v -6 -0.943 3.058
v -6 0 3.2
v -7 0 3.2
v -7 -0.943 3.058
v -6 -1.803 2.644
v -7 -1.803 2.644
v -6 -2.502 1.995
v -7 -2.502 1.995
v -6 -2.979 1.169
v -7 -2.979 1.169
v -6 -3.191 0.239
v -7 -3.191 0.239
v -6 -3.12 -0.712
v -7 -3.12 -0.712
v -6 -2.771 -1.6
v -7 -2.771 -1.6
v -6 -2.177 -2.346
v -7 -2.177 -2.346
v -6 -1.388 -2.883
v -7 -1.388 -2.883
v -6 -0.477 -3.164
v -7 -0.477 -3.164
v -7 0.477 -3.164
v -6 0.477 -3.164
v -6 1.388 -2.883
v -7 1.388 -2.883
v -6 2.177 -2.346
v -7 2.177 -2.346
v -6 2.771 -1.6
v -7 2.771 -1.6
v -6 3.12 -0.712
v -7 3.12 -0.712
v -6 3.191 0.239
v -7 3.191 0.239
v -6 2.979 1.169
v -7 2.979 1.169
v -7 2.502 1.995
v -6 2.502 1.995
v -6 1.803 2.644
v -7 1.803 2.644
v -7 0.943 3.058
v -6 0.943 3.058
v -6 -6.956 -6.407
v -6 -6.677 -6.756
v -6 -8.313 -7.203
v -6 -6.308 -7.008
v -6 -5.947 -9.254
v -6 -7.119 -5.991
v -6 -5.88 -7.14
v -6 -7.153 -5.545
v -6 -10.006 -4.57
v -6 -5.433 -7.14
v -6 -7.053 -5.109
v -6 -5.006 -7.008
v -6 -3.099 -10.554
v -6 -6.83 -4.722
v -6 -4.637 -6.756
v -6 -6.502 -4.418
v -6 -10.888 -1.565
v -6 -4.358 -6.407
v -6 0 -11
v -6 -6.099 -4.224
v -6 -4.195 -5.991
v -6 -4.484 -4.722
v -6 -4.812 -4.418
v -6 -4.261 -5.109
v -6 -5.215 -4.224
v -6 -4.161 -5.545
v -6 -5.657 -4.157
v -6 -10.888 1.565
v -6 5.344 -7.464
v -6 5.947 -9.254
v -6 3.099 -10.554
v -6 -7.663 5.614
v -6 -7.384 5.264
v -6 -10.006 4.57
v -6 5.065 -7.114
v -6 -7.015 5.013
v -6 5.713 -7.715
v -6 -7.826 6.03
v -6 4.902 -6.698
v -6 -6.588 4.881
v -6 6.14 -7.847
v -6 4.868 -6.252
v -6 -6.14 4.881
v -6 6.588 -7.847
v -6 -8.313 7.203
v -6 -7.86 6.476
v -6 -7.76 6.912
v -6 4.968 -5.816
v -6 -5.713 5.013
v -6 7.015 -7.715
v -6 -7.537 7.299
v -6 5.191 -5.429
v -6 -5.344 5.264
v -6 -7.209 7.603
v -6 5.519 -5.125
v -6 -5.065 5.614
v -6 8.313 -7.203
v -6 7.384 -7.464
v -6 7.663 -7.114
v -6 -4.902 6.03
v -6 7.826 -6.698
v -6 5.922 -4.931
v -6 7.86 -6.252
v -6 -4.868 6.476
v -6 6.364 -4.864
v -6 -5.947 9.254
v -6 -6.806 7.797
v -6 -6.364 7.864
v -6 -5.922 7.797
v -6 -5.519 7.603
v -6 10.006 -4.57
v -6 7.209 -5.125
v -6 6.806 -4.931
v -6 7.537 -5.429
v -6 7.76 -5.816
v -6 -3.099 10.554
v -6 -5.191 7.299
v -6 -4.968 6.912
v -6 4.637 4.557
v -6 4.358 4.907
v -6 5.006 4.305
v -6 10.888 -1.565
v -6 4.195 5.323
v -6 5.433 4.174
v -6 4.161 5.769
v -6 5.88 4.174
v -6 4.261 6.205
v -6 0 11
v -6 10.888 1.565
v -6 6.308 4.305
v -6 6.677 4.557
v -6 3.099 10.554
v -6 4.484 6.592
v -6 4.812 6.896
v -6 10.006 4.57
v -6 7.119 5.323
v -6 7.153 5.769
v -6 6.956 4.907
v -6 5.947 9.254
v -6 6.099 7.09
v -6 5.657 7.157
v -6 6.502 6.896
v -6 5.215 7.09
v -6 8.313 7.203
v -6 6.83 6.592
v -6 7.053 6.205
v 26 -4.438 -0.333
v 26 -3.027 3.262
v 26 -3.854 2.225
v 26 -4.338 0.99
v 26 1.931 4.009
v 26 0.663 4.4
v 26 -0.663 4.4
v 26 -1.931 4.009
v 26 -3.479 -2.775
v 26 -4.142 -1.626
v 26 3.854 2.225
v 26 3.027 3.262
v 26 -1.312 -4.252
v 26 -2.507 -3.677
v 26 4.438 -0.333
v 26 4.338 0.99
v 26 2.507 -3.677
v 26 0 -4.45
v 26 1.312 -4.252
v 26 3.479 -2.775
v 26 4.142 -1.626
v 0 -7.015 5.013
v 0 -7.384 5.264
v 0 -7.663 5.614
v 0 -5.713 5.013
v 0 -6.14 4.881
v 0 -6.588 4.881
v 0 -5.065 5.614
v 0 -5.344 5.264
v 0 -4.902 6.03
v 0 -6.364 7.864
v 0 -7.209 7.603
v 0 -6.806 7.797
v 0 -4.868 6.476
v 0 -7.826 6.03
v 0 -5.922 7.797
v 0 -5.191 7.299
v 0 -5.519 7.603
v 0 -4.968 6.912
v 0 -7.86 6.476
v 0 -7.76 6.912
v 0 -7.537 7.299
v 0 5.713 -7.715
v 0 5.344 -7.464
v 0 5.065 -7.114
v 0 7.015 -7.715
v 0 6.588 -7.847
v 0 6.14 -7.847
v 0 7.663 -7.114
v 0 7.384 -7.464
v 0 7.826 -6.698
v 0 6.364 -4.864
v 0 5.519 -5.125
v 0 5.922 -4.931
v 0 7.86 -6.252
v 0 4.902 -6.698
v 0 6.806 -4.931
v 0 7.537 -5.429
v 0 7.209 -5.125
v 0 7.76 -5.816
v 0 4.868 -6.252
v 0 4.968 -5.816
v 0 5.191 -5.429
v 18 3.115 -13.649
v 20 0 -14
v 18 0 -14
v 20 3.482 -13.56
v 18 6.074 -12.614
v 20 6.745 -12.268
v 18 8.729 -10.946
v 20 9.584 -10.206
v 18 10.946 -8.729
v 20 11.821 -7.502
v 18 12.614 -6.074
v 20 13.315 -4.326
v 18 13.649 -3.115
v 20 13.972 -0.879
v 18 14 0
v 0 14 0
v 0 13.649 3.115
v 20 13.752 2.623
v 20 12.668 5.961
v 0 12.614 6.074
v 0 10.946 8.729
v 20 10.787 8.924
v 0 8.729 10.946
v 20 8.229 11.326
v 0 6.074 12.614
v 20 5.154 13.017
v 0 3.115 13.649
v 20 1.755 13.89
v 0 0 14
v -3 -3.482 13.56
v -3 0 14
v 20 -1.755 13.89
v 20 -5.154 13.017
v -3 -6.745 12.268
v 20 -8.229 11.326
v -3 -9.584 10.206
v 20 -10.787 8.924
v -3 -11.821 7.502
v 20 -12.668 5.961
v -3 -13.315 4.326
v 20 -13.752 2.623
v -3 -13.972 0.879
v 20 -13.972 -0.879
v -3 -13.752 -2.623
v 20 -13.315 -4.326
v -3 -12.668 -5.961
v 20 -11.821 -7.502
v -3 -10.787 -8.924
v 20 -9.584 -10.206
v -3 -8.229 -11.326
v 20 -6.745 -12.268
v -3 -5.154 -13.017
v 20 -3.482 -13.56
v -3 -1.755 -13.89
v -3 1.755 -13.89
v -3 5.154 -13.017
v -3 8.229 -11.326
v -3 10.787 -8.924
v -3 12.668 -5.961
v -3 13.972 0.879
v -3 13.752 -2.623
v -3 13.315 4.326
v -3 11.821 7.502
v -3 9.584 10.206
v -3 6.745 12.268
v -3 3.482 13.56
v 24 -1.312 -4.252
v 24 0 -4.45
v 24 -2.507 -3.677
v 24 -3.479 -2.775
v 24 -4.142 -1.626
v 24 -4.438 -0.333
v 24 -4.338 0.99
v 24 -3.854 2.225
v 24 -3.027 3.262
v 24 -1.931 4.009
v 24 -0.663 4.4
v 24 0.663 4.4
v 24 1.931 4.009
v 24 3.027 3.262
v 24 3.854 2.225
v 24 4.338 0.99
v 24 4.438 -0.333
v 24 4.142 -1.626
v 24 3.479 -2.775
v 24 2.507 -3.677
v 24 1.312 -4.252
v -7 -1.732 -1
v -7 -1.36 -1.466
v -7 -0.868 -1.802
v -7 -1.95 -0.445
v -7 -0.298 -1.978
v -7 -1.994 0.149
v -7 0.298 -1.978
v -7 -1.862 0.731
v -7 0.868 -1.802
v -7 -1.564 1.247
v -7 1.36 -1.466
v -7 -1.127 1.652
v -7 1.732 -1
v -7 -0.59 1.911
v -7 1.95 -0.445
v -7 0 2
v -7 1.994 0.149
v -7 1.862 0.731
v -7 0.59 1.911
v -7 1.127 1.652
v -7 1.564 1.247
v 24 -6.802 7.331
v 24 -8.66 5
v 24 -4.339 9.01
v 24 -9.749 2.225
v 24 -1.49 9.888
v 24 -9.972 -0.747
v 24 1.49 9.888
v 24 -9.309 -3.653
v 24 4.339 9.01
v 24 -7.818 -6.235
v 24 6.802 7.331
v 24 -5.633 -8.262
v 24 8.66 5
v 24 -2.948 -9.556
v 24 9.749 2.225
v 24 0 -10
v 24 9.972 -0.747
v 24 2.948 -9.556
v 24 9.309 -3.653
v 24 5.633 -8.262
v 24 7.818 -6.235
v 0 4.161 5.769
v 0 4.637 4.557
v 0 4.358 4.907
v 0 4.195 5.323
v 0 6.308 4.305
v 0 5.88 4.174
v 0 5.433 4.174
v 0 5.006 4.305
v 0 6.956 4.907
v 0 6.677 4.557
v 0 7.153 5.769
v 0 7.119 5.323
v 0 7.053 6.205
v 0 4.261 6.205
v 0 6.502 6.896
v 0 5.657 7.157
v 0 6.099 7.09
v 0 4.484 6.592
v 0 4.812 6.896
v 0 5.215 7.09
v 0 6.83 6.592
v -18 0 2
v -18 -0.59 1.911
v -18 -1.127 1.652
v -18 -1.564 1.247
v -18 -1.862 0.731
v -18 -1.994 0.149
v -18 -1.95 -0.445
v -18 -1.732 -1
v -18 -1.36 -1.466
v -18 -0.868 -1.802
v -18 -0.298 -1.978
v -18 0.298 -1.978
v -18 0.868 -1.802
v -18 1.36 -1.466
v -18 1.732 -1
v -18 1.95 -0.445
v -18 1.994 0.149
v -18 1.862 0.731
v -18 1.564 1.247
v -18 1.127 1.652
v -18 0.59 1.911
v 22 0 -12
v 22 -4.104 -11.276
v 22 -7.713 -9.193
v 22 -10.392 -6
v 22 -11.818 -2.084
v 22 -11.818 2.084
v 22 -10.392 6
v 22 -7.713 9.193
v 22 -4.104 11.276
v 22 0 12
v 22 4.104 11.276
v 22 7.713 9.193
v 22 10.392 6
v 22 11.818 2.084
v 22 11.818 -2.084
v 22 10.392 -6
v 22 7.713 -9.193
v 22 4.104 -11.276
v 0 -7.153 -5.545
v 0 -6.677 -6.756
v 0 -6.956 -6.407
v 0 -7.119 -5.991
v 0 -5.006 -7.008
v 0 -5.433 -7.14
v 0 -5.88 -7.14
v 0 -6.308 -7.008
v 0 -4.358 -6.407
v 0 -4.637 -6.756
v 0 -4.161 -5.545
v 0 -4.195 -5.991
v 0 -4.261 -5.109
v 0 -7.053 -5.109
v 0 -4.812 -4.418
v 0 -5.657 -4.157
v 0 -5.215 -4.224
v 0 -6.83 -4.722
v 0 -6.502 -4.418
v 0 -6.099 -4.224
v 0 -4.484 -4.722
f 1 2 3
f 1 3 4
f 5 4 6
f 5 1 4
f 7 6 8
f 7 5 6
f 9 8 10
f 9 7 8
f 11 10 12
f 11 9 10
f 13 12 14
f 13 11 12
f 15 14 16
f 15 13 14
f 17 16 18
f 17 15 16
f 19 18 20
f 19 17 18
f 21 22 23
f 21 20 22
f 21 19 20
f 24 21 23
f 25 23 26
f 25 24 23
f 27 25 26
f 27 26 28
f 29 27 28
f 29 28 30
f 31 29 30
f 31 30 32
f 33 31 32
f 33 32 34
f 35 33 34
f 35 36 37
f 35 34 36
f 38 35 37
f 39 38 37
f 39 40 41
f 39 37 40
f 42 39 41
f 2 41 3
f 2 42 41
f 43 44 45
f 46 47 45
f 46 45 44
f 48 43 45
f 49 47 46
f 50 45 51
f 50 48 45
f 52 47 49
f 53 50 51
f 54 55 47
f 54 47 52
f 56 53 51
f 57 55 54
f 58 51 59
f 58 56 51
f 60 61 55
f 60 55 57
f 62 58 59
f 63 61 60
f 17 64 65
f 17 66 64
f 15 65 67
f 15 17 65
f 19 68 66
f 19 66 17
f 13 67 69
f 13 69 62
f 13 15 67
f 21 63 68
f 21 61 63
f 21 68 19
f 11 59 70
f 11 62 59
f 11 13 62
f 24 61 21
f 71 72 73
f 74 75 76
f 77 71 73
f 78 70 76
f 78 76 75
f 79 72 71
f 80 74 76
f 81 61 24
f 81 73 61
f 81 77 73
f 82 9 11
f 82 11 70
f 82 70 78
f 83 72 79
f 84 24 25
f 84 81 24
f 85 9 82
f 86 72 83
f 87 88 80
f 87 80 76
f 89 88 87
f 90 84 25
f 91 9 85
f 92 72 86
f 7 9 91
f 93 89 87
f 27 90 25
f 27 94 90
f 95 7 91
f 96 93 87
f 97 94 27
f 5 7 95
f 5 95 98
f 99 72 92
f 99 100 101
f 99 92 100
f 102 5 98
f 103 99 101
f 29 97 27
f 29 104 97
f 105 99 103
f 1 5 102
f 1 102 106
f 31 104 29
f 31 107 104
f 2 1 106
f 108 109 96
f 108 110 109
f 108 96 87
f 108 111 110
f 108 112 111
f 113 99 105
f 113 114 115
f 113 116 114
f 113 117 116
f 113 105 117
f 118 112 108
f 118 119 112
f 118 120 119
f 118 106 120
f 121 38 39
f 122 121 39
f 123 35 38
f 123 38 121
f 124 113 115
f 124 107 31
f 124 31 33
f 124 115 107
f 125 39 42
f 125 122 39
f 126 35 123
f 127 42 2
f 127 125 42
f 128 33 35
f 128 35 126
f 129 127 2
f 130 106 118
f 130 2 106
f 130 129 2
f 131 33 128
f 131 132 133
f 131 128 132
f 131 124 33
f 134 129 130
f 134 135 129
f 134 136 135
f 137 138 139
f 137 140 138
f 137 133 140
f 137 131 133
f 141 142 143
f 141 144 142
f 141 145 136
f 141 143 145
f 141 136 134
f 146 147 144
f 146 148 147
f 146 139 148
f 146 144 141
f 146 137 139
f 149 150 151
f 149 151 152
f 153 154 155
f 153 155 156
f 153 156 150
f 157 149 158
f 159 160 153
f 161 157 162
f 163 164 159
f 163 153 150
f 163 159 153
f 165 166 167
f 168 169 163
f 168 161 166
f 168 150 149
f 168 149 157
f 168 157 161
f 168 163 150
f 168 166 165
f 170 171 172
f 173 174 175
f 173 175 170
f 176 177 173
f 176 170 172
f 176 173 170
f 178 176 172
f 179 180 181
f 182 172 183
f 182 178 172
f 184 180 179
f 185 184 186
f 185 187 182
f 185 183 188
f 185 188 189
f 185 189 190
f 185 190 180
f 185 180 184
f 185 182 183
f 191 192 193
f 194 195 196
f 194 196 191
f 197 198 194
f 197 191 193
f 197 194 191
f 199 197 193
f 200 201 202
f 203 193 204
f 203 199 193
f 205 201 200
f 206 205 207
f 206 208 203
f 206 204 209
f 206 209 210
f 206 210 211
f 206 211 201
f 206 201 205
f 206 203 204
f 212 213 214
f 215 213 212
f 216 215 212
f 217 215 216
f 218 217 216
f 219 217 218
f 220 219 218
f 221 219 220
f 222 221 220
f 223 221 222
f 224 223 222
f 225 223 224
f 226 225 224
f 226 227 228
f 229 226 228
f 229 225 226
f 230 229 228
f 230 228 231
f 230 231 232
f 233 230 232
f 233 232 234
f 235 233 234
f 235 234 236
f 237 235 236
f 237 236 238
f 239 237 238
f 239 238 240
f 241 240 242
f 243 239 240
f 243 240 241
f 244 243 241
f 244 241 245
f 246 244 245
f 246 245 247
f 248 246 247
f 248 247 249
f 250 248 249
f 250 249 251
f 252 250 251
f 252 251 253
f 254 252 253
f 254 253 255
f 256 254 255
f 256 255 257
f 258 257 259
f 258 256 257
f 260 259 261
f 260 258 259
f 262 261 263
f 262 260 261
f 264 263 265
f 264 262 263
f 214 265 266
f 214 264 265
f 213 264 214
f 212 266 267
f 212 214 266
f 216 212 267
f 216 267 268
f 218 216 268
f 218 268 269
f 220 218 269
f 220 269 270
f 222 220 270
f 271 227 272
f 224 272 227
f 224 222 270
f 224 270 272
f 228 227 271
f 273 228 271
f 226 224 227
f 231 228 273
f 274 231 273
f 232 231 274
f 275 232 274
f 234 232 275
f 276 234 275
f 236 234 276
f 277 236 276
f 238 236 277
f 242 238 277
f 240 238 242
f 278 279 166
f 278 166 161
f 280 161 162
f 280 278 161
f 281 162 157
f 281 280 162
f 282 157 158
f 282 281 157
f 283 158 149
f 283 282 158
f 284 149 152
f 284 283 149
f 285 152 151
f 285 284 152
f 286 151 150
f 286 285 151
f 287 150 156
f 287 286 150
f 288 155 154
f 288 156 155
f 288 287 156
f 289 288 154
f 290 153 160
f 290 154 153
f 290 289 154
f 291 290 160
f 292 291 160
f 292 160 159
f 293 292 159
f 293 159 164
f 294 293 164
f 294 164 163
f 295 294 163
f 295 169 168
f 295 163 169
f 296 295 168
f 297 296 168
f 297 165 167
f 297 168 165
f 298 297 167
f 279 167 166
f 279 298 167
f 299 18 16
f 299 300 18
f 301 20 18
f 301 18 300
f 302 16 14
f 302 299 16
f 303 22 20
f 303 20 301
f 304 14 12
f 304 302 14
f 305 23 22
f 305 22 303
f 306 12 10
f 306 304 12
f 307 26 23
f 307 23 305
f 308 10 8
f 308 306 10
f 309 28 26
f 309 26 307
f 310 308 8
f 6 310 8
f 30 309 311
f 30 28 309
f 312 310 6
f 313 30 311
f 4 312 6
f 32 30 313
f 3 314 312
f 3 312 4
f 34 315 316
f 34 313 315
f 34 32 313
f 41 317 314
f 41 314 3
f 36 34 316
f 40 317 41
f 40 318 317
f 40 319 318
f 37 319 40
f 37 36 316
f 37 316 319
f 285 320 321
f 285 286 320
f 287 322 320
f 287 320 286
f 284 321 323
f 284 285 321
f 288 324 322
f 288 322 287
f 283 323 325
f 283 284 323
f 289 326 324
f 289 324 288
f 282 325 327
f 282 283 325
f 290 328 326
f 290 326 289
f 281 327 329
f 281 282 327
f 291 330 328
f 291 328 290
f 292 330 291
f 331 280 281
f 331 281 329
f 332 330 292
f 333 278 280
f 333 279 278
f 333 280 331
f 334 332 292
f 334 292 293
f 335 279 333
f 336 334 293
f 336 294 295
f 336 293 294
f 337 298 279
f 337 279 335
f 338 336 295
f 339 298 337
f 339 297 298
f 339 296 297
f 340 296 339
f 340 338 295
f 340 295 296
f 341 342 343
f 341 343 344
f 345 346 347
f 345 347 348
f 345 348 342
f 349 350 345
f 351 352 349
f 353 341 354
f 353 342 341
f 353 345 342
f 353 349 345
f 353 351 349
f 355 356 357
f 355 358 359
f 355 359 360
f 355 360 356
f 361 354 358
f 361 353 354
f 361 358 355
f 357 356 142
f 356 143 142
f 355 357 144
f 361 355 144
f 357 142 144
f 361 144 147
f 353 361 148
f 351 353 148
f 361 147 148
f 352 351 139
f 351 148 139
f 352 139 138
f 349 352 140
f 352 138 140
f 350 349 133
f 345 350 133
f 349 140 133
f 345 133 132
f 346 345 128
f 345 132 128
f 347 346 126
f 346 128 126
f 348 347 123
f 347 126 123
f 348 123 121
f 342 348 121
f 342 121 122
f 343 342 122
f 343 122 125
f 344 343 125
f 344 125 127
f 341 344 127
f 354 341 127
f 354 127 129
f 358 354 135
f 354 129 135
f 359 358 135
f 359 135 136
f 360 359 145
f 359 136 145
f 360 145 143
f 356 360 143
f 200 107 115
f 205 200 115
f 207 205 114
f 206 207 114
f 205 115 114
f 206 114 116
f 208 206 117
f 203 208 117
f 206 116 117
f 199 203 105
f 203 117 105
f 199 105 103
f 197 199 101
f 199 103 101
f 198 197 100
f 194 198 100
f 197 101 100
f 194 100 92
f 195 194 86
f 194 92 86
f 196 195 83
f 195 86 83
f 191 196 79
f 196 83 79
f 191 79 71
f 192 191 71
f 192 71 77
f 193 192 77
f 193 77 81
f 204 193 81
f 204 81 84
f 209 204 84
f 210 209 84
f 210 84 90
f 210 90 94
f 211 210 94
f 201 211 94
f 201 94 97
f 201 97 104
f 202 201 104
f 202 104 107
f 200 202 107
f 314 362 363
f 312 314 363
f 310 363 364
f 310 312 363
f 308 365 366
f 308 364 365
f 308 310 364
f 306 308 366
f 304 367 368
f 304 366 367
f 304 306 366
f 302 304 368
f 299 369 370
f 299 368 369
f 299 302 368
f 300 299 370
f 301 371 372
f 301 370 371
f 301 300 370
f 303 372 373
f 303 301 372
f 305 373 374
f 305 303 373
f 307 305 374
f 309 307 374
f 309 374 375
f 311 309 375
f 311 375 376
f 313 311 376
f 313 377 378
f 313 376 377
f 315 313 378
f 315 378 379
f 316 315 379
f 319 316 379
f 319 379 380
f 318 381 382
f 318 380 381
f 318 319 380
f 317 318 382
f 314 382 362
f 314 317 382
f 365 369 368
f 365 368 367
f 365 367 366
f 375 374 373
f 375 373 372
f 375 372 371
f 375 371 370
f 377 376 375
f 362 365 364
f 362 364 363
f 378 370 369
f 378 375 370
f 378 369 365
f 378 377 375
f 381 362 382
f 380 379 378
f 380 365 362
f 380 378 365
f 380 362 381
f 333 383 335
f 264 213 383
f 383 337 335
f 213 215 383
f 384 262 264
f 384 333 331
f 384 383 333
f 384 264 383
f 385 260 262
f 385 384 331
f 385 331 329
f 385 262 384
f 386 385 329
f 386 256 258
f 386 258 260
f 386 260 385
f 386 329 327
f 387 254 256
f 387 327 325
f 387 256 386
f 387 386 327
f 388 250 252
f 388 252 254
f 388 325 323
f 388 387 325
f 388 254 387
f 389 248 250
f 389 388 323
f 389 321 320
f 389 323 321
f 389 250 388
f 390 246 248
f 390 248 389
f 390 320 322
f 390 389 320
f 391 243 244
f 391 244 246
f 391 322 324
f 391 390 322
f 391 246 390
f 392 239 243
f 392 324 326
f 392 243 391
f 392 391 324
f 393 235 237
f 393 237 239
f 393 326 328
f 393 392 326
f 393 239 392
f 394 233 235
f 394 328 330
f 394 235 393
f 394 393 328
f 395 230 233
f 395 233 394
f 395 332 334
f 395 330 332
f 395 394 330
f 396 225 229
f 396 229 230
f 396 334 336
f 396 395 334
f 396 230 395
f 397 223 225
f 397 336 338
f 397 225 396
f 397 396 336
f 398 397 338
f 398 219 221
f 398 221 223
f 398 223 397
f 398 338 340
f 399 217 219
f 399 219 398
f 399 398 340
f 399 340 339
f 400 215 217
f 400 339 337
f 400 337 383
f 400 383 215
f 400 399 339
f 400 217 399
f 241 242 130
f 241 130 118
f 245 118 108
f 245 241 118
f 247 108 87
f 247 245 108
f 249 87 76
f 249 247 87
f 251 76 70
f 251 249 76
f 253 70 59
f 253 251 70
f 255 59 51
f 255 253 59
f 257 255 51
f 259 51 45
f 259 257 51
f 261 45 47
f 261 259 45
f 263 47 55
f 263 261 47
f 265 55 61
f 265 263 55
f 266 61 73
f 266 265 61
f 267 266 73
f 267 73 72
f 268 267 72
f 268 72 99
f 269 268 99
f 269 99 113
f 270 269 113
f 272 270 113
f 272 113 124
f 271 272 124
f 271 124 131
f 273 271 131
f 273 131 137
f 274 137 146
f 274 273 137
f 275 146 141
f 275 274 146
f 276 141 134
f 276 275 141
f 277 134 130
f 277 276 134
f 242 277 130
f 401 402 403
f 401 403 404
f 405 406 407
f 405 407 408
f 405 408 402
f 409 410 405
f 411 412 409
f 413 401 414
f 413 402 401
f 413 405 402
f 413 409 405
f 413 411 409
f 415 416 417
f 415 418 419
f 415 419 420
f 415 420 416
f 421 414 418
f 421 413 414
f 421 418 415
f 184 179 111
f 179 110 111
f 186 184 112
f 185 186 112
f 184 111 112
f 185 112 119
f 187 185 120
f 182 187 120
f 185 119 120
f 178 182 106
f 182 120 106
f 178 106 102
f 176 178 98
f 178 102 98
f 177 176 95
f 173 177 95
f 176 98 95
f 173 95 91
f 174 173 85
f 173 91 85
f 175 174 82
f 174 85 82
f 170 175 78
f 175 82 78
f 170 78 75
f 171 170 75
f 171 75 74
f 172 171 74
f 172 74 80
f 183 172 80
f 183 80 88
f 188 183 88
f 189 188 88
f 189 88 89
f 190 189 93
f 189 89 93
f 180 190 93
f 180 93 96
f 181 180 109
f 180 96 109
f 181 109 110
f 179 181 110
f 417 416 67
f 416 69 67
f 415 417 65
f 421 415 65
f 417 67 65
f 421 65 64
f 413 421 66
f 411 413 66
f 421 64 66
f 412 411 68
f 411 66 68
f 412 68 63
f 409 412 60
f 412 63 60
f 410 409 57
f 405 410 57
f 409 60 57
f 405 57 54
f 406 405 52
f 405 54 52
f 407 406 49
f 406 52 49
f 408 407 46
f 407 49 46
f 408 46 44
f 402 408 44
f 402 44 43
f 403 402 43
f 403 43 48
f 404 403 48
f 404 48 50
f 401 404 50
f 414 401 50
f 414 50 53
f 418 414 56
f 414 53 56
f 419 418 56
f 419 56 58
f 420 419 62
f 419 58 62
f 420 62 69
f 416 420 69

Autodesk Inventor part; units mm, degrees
ref_plane "YZ Plane" through (0, 0, 0) normal (1, 0, 0) x (0, 1, 0)
ref_plane "XZ Plane" through (0, 0, 0) normal (0, 1, 0) x (-1, 0, 0)
ref_plane "XY Plane" through (0, 0, 0) normal (0, 0, 1) x (1, 0, 0)
sketch "Эскиз1" plane through (0, 0, 0) normal (1, 0, 0) x (0, 1, 0)
  circle A0 centre (0, 0) radius 14
  dimension "d0" = 28
extrude "Выдавливание1" add sketch "Эскиз1" along normal blind 18
sketch "Эскиз2" plane through (18, 0, 0) normal (1, 0, 0) x (0, 0, -1)
  circle A0 centre (0, 0) radius 14
  dimension "d3" = 28
extrude "Выдавливание2" add sketch "Эскиз2" along normal blind 6
chamfer "Фаска1" distance 4 angle 45 1 edges at (24, 0, 14)
sketch "Эскиз3" plane through (24, 0, 0) normal (1, 0, 0) x (0, 0, -1)
  circle A0 centre (0, 0) radius 4.45
  dimension "d9" = 8.9
extrude "Выдавливание3" add sketch "Эскиз3" along normal blind 2
sketch "Эскиз4" plane through (0, 0, 0) normal (-1, 0, 0) x (0, 0, 1)
  circle A0 centre (0, 0) radius 14
  dimension "d12" = 28
extrude "Выдавливание4" add sketch "Эскиз4" along normal blind 6
chamfer "Фаска2" distance 3 angle 45 1 edges at (-6, 0, -14)
sketch "Эскиз5" plane through (-6, 0, 0) normal (-1, 0, 0) x (0, 0, 1)
  circle A0 centre (0, 0) radius 3.2
  dimension "d18" = 6.4
extrude "Выдавливание5" add sketch "Эскиз5" along normal blind 1
sketch "Эскиз6" plane through (-7, 0, 0) normal (-1, 0, 0) x (0, 0, 1)
  circle A0 centre (0, 0) radius 2
  dimension "d21" = 4
extrude "Выдавливание6" add sketch "Эскиз6" along normal blind 11
sketch "Эскиз7" plane through (-6, 0, 0) normal (-1, 0, 0) x (0, 0, 1)
  circle A0 centre (5.6569, 5.6569) radius 1.5
  line L0 (0, 0) -> (14, 0) construction
  circle A1 centre (0, 0) radius 14 construction
  line L1 (0, 0) -> (0, 14) construction
  line L2 (-4.7873, -4.7873) -> (5.6569, 5.6569) construction
  circle A2 centre (0, 0) radius 2 construction
  line L3 (-6.364, 6.364) -> (6.364, -6.364) construction
  circle A3 centre (-6.364, 6.364) radius 1.5
  circle A4 centre (6.364, -6.364) radius 1.5
  circle A5 centre (-5.6569, -5.6569) radius 1.5
  circle A6 centre (0, 0) radius 14 construction
  dimension "d24" = 3
  dimension "d29" = 45
  dimension "d30" = 3
  dimension "d31" = 16
  dimension "d32" = 18
extrude "Выдавливание7" cut sketch "Эскиз7" against normal blind 6
properties part number "motor_sketch"
